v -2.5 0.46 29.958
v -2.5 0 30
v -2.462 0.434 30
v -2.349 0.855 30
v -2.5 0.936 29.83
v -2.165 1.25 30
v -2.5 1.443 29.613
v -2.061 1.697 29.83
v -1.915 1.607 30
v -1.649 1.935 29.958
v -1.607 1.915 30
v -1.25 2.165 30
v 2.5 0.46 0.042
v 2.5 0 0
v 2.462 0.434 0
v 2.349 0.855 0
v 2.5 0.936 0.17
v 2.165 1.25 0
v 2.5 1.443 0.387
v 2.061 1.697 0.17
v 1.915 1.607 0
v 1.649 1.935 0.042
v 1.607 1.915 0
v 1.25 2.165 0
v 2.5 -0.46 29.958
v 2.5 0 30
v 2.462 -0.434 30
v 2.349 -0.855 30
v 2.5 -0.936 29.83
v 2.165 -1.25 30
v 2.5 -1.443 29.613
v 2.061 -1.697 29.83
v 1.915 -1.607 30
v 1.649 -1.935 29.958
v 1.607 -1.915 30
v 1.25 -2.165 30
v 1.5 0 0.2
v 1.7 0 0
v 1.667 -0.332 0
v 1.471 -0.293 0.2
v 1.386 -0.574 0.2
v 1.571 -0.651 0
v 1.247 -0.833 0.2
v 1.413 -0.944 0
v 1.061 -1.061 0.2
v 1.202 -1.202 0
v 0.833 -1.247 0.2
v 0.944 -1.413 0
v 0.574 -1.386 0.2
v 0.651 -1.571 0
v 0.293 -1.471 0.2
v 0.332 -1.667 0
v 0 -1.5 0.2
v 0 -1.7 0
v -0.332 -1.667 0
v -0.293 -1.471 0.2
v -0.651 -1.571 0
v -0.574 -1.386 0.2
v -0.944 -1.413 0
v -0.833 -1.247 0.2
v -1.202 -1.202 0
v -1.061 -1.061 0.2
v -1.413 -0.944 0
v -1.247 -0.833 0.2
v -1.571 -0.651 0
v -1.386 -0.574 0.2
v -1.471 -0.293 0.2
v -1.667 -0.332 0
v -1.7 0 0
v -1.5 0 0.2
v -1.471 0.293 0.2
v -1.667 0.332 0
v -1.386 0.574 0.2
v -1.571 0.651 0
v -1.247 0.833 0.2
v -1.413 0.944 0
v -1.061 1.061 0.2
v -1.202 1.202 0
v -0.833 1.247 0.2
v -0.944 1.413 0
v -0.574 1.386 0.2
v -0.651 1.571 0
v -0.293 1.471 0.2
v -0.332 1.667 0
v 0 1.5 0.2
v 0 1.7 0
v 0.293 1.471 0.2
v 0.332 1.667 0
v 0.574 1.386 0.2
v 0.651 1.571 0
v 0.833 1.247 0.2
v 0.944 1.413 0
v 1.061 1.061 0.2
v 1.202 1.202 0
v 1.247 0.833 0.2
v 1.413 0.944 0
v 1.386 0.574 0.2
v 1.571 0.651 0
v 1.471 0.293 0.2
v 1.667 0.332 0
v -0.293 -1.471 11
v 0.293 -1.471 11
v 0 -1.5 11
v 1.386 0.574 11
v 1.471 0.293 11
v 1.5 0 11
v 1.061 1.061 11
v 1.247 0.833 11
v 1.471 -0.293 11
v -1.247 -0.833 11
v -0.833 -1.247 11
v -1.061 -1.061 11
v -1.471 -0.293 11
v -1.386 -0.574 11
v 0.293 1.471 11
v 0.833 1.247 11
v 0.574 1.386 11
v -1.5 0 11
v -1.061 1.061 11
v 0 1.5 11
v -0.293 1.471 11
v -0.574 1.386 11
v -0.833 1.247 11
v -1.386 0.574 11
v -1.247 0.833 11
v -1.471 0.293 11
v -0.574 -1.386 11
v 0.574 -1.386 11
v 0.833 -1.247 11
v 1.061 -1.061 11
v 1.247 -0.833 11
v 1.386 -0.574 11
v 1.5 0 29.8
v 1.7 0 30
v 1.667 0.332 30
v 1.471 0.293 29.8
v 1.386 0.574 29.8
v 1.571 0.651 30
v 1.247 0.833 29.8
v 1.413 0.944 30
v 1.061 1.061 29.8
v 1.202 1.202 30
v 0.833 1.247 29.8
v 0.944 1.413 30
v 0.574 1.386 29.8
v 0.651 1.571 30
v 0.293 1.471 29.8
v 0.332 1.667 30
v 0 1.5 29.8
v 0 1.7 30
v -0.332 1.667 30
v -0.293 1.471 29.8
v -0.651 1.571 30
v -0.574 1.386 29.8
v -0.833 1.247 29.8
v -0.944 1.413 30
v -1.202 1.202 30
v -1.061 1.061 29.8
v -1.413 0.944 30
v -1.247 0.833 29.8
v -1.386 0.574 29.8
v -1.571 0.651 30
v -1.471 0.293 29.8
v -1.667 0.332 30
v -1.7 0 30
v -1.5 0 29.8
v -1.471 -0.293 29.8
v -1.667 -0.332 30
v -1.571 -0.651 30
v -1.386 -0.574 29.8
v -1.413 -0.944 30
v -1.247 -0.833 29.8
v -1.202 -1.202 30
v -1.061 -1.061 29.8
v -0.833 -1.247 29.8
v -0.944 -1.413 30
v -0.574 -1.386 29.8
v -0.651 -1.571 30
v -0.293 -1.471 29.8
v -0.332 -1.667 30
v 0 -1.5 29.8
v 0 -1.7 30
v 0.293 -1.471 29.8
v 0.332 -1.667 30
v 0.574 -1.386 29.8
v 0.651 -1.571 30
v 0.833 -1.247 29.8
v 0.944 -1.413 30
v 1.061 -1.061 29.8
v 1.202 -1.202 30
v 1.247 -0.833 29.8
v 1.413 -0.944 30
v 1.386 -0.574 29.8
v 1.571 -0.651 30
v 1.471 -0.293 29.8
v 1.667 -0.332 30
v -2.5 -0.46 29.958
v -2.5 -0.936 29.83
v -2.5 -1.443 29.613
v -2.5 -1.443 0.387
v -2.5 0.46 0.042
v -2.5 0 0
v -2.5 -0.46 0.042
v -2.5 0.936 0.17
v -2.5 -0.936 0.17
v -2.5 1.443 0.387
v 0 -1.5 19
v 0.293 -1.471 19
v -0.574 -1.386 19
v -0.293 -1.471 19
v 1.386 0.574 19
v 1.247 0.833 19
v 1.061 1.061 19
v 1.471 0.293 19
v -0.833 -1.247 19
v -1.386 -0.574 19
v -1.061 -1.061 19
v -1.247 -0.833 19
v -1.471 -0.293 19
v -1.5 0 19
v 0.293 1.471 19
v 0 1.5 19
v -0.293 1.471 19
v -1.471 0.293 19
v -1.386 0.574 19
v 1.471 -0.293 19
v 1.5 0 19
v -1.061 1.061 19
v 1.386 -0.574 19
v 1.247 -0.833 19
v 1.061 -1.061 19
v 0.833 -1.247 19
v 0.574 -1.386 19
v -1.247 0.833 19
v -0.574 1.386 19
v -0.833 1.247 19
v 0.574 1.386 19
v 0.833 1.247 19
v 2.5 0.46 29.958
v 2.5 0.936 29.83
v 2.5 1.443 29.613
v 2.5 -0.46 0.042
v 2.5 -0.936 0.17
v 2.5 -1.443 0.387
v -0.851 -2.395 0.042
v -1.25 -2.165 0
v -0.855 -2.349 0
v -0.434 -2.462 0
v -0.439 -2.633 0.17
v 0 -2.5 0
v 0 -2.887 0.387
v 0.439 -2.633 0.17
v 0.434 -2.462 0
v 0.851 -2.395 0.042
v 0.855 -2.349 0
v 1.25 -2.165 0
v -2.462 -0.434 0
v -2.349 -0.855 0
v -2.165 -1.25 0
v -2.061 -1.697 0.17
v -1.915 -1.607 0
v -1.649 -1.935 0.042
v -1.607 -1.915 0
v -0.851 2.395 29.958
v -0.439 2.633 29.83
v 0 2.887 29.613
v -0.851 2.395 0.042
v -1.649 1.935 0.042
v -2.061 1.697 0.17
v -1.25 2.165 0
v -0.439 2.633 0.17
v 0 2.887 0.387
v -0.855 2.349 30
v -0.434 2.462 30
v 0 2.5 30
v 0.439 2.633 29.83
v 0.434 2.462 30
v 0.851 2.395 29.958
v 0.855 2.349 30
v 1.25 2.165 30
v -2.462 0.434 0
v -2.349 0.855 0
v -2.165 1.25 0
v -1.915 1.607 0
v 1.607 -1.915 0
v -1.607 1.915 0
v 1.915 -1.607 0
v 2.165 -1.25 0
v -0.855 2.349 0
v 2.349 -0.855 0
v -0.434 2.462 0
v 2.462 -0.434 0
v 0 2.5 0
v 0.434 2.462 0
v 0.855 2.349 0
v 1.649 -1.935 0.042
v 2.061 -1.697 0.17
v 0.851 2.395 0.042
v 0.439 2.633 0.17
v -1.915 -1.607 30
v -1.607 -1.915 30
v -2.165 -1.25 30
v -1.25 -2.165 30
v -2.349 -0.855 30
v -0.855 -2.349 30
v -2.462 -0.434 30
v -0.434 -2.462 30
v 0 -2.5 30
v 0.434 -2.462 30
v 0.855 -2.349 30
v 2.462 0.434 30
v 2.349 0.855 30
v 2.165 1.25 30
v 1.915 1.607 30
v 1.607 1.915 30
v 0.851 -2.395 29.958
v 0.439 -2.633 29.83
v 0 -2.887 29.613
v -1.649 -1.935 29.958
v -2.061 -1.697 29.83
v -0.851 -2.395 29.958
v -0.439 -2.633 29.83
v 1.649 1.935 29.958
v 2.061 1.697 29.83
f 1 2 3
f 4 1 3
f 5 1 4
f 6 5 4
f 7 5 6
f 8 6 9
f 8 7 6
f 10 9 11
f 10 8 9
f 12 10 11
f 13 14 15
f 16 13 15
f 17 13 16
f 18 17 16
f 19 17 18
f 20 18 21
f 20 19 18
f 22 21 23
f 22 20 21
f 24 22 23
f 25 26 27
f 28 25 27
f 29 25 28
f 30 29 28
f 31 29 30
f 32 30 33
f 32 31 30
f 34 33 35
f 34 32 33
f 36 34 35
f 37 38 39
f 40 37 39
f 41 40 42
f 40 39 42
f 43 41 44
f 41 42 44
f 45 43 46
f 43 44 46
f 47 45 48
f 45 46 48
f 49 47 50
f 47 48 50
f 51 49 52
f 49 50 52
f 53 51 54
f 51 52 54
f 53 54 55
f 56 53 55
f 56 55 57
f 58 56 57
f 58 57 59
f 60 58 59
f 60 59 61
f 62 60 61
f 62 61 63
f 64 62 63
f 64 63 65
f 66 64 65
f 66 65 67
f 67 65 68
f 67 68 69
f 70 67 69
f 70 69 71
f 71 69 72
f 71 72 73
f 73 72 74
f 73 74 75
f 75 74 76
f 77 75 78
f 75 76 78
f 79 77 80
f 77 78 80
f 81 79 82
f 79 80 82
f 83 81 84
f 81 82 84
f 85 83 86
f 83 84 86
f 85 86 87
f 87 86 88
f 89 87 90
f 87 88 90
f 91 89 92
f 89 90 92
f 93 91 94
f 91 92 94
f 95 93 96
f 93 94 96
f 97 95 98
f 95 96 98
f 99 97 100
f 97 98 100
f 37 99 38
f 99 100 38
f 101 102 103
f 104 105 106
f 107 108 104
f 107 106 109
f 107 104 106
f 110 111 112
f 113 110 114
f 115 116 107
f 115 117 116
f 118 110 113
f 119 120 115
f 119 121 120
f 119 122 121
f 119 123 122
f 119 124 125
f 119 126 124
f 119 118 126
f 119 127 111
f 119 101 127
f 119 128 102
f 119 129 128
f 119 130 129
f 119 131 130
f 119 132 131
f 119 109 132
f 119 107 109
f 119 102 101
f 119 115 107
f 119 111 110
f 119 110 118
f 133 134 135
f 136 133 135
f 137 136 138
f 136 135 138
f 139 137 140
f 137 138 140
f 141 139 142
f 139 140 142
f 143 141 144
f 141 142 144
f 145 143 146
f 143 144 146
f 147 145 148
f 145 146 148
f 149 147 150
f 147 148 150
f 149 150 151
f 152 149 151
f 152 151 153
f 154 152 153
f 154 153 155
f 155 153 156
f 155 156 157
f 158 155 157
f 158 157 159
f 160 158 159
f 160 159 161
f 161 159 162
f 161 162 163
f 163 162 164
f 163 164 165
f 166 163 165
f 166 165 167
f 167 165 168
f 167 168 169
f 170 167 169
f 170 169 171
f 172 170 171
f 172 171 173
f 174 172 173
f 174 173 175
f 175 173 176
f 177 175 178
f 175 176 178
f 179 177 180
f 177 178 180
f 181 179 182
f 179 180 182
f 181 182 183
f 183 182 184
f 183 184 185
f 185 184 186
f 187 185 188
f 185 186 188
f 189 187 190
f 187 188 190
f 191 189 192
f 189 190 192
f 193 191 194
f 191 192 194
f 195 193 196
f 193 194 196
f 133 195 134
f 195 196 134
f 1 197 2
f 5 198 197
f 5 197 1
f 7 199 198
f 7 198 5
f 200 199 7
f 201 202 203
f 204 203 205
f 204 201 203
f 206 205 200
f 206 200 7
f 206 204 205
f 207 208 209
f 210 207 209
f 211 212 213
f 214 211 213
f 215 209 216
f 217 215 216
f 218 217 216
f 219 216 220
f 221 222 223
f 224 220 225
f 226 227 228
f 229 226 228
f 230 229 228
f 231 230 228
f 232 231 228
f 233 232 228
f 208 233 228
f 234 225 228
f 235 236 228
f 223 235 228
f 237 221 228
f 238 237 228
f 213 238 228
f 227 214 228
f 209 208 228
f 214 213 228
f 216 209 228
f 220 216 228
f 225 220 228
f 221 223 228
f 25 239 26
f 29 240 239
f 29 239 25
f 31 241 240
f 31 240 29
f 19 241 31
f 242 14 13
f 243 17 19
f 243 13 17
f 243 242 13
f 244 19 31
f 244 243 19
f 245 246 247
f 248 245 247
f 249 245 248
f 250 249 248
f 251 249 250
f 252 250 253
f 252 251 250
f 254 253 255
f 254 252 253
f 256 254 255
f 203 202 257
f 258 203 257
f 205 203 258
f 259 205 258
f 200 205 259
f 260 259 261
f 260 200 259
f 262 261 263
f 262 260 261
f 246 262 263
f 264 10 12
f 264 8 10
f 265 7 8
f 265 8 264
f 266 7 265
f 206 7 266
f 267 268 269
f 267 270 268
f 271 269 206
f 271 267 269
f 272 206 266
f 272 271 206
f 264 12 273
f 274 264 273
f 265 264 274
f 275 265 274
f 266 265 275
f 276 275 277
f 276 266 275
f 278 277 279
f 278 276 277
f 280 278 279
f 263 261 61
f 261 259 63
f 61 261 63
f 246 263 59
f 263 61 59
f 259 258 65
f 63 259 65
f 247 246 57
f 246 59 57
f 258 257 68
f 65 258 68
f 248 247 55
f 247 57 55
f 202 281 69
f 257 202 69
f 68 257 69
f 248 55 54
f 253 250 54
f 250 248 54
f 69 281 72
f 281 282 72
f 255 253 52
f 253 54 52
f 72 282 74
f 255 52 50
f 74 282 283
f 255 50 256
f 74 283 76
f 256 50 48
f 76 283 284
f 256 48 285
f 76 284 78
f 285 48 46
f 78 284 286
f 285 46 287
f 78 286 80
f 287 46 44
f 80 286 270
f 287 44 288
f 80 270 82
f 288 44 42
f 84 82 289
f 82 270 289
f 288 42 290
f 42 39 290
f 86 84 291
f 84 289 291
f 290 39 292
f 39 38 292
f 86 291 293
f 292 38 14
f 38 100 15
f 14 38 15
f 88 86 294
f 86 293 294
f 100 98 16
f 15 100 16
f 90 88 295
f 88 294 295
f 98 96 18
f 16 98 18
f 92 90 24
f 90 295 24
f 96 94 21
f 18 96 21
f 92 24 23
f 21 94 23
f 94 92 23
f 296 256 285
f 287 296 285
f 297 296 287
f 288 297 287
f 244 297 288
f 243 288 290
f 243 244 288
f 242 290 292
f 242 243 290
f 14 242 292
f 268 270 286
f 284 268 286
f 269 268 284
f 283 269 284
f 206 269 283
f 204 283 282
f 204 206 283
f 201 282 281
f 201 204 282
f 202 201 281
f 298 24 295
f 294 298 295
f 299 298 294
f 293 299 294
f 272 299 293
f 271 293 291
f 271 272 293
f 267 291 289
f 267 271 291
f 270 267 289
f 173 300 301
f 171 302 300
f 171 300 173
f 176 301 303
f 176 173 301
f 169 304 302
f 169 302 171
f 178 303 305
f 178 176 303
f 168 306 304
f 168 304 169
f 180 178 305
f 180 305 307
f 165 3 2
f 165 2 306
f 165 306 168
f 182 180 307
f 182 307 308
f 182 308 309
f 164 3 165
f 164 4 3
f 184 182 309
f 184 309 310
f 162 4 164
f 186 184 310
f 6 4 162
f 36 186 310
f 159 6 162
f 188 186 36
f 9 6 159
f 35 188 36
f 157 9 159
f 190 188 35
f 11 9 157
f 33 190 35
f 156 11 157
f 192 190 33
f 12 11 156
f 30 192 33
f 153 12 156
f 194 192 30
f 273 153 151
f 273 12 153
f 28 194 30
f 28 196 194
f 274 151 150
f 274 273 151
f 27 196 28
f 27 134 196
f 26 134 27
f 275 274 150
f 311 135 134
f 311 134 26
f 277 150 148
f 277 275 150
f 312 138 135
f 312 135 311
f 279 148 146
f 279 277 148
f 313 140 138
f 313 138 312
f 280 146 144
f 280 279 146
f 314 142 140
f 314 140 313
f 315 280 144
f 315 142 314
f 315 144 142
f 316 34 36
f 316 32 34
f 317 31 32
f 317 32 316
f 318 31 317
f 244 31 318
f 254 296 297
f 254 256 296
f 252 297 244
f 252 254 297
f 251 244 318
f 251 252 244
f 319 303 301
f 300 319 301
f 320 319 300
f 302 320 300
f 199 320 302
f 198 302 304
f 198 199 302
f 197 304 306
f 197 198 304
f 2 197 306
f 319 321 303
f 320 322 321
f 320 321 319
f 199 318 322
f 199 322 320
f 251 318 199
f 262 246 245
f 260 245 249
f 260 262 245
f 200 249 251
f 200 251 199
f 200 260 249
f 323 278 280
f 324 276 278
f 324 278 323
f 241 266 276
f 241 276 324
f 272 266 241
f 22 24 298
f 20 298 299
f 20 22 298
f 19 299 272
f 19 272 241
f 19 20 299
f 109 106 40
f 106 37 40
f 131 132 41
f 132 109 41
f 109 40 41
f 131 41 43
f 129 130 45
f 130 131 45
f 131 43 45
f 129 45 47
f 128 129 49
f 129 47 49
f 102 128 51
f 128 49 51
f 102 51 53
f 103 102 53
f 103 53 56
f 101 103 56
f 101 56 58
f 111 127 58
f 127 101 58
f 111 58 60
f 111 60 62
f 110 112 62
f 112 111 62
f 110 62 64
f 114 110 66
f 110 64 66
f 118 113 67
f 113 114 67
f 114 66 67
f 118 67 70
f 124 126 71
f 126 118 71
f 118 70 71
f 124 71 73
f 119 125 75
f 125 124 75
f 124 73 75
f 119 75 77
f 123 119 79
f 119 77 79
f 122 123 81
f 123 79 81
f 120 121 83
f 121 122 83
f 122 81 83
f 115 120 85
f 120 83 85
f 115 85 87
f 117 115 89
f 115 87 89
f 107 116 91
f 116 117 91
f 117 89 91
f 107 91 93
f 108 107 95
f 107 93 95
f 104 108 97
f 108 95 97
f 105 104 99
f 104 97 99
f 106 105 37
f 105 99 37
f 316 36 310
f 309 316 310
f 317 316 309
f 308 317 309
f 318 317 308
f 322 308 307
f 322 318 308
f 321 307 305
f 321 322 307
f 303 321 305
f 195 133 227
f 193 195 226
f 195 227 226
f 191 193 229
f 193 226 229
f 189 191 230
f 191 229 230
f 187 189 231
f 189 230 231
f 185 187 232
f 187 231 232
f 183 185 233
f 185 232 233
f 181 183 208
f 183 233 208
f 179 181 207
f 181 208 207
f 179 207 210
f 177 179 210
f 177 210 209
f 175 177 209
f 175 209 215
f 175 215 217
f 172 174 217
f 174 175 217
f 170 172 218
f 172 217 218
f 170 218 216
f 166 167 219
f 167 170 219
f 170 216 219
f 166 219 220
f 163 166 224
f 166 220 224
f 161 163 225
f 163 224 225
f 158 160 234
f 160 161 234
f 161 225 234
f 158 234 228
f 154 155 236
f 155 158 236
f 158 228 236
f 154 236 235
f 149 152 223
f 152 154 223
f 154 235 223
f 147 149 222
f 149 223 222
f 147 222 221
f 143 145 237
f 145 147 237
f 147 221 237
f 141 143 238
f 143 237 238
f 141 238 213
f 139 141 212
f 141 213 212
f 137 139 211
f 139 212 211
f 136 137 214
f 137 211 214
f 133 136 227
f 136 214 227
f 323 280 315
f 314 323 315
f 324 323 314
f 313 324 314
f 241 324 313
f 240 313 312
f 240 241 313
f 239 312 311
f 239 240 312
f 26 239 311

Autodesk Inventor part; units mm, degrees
ref_plane "YZ Plane" through (0, 0, 0) normal (1, 0, 0) x (0, 1, 0)
ref_plane "XZ Plane" through (0, 0, 0) normal (0, 1, 0) x (-1, 0, 0)
sketch "Náčrt1" plane through (0, 0, 0) normal (0, 0, 1) x (1, 0, 0)
  line L0 (2.5, -1.4434) -> (0, -2.8868)
  line L1 (0, -2.8868) -> (-2.5, -1.4434)
  line L2 (-2.5, -1.4434) -> (-2.5, 1.4434)
  line L3 (-2.5, 1.4434) -> (0, 2.8868)
  line L4 (0, 2.8868) -> (2.5, 1.4434)
  line L5 (2.5, 1.4434) -> (2.5, -1.4434)
  circle A0 centre (0, 0) radius 1.5
  point P0 (2.5, 0)
  dimension "d1" = 3
  dimension "d16" = 5
extrude "Vysunutí1" add sketch "Náčrt1" along normal blind 30
thread "Závit1" size "M3x0.5" class "6H" standard "ANSI Metric M Profile" full length
sketch "Náčrt2" plane through (0, 0, 30) normal (0, 0, 1) x (1, 0, 0)
  circle A0 centre (0, 0) radius 2.5
  dimension "d18" = 5
extrude "Vysunutí2" cut sketch "Náčrt2" against normal through all draft 45 keep common part
sketch "Náčrt3" plane through (0, 0, 0) normal (0, 0, -1) x (-1, 0, 0)
  circle A0 centre (0, 0) radius 2.5
  dimension "d17" = 5
extrude "Vysunutí3" cut sketch "Náčrt3" against normal through all draft 45 keep common part
chamfer "Zkosení1" distance 0.2 angle 45 1 edges at (-1.5, 0, 30)
chamfer "Zkosení2" distance 0.2 angle 45 1 edges at (-1.5, 0, 0)
ref_plane "Pracovní rovina1" through (0, 0, 15) normal (0, 0, -1) x (-1, 0, 0)
sketch "Náčrt4" plane through (-2.5, 1.4434, 29.6132) normal (-0.5, 0.8660254, 0) x (0.8660254, 0.5, 0)
  point P0 (1.4434, 29.6132)
sketch "Náčrt5" plane through (0, 0, 15) normal (0, 0, -1) x (-1, 0, 0)
  circle A0 centre (0, 0) radius 1.5
extrude "Vysunutí4" add sketch "Náčrt5" along normal mid plane 8
properties part number "PillarBolt-M3x30" material "Ocel, vysokopevnostní, nízkolegovaná"
